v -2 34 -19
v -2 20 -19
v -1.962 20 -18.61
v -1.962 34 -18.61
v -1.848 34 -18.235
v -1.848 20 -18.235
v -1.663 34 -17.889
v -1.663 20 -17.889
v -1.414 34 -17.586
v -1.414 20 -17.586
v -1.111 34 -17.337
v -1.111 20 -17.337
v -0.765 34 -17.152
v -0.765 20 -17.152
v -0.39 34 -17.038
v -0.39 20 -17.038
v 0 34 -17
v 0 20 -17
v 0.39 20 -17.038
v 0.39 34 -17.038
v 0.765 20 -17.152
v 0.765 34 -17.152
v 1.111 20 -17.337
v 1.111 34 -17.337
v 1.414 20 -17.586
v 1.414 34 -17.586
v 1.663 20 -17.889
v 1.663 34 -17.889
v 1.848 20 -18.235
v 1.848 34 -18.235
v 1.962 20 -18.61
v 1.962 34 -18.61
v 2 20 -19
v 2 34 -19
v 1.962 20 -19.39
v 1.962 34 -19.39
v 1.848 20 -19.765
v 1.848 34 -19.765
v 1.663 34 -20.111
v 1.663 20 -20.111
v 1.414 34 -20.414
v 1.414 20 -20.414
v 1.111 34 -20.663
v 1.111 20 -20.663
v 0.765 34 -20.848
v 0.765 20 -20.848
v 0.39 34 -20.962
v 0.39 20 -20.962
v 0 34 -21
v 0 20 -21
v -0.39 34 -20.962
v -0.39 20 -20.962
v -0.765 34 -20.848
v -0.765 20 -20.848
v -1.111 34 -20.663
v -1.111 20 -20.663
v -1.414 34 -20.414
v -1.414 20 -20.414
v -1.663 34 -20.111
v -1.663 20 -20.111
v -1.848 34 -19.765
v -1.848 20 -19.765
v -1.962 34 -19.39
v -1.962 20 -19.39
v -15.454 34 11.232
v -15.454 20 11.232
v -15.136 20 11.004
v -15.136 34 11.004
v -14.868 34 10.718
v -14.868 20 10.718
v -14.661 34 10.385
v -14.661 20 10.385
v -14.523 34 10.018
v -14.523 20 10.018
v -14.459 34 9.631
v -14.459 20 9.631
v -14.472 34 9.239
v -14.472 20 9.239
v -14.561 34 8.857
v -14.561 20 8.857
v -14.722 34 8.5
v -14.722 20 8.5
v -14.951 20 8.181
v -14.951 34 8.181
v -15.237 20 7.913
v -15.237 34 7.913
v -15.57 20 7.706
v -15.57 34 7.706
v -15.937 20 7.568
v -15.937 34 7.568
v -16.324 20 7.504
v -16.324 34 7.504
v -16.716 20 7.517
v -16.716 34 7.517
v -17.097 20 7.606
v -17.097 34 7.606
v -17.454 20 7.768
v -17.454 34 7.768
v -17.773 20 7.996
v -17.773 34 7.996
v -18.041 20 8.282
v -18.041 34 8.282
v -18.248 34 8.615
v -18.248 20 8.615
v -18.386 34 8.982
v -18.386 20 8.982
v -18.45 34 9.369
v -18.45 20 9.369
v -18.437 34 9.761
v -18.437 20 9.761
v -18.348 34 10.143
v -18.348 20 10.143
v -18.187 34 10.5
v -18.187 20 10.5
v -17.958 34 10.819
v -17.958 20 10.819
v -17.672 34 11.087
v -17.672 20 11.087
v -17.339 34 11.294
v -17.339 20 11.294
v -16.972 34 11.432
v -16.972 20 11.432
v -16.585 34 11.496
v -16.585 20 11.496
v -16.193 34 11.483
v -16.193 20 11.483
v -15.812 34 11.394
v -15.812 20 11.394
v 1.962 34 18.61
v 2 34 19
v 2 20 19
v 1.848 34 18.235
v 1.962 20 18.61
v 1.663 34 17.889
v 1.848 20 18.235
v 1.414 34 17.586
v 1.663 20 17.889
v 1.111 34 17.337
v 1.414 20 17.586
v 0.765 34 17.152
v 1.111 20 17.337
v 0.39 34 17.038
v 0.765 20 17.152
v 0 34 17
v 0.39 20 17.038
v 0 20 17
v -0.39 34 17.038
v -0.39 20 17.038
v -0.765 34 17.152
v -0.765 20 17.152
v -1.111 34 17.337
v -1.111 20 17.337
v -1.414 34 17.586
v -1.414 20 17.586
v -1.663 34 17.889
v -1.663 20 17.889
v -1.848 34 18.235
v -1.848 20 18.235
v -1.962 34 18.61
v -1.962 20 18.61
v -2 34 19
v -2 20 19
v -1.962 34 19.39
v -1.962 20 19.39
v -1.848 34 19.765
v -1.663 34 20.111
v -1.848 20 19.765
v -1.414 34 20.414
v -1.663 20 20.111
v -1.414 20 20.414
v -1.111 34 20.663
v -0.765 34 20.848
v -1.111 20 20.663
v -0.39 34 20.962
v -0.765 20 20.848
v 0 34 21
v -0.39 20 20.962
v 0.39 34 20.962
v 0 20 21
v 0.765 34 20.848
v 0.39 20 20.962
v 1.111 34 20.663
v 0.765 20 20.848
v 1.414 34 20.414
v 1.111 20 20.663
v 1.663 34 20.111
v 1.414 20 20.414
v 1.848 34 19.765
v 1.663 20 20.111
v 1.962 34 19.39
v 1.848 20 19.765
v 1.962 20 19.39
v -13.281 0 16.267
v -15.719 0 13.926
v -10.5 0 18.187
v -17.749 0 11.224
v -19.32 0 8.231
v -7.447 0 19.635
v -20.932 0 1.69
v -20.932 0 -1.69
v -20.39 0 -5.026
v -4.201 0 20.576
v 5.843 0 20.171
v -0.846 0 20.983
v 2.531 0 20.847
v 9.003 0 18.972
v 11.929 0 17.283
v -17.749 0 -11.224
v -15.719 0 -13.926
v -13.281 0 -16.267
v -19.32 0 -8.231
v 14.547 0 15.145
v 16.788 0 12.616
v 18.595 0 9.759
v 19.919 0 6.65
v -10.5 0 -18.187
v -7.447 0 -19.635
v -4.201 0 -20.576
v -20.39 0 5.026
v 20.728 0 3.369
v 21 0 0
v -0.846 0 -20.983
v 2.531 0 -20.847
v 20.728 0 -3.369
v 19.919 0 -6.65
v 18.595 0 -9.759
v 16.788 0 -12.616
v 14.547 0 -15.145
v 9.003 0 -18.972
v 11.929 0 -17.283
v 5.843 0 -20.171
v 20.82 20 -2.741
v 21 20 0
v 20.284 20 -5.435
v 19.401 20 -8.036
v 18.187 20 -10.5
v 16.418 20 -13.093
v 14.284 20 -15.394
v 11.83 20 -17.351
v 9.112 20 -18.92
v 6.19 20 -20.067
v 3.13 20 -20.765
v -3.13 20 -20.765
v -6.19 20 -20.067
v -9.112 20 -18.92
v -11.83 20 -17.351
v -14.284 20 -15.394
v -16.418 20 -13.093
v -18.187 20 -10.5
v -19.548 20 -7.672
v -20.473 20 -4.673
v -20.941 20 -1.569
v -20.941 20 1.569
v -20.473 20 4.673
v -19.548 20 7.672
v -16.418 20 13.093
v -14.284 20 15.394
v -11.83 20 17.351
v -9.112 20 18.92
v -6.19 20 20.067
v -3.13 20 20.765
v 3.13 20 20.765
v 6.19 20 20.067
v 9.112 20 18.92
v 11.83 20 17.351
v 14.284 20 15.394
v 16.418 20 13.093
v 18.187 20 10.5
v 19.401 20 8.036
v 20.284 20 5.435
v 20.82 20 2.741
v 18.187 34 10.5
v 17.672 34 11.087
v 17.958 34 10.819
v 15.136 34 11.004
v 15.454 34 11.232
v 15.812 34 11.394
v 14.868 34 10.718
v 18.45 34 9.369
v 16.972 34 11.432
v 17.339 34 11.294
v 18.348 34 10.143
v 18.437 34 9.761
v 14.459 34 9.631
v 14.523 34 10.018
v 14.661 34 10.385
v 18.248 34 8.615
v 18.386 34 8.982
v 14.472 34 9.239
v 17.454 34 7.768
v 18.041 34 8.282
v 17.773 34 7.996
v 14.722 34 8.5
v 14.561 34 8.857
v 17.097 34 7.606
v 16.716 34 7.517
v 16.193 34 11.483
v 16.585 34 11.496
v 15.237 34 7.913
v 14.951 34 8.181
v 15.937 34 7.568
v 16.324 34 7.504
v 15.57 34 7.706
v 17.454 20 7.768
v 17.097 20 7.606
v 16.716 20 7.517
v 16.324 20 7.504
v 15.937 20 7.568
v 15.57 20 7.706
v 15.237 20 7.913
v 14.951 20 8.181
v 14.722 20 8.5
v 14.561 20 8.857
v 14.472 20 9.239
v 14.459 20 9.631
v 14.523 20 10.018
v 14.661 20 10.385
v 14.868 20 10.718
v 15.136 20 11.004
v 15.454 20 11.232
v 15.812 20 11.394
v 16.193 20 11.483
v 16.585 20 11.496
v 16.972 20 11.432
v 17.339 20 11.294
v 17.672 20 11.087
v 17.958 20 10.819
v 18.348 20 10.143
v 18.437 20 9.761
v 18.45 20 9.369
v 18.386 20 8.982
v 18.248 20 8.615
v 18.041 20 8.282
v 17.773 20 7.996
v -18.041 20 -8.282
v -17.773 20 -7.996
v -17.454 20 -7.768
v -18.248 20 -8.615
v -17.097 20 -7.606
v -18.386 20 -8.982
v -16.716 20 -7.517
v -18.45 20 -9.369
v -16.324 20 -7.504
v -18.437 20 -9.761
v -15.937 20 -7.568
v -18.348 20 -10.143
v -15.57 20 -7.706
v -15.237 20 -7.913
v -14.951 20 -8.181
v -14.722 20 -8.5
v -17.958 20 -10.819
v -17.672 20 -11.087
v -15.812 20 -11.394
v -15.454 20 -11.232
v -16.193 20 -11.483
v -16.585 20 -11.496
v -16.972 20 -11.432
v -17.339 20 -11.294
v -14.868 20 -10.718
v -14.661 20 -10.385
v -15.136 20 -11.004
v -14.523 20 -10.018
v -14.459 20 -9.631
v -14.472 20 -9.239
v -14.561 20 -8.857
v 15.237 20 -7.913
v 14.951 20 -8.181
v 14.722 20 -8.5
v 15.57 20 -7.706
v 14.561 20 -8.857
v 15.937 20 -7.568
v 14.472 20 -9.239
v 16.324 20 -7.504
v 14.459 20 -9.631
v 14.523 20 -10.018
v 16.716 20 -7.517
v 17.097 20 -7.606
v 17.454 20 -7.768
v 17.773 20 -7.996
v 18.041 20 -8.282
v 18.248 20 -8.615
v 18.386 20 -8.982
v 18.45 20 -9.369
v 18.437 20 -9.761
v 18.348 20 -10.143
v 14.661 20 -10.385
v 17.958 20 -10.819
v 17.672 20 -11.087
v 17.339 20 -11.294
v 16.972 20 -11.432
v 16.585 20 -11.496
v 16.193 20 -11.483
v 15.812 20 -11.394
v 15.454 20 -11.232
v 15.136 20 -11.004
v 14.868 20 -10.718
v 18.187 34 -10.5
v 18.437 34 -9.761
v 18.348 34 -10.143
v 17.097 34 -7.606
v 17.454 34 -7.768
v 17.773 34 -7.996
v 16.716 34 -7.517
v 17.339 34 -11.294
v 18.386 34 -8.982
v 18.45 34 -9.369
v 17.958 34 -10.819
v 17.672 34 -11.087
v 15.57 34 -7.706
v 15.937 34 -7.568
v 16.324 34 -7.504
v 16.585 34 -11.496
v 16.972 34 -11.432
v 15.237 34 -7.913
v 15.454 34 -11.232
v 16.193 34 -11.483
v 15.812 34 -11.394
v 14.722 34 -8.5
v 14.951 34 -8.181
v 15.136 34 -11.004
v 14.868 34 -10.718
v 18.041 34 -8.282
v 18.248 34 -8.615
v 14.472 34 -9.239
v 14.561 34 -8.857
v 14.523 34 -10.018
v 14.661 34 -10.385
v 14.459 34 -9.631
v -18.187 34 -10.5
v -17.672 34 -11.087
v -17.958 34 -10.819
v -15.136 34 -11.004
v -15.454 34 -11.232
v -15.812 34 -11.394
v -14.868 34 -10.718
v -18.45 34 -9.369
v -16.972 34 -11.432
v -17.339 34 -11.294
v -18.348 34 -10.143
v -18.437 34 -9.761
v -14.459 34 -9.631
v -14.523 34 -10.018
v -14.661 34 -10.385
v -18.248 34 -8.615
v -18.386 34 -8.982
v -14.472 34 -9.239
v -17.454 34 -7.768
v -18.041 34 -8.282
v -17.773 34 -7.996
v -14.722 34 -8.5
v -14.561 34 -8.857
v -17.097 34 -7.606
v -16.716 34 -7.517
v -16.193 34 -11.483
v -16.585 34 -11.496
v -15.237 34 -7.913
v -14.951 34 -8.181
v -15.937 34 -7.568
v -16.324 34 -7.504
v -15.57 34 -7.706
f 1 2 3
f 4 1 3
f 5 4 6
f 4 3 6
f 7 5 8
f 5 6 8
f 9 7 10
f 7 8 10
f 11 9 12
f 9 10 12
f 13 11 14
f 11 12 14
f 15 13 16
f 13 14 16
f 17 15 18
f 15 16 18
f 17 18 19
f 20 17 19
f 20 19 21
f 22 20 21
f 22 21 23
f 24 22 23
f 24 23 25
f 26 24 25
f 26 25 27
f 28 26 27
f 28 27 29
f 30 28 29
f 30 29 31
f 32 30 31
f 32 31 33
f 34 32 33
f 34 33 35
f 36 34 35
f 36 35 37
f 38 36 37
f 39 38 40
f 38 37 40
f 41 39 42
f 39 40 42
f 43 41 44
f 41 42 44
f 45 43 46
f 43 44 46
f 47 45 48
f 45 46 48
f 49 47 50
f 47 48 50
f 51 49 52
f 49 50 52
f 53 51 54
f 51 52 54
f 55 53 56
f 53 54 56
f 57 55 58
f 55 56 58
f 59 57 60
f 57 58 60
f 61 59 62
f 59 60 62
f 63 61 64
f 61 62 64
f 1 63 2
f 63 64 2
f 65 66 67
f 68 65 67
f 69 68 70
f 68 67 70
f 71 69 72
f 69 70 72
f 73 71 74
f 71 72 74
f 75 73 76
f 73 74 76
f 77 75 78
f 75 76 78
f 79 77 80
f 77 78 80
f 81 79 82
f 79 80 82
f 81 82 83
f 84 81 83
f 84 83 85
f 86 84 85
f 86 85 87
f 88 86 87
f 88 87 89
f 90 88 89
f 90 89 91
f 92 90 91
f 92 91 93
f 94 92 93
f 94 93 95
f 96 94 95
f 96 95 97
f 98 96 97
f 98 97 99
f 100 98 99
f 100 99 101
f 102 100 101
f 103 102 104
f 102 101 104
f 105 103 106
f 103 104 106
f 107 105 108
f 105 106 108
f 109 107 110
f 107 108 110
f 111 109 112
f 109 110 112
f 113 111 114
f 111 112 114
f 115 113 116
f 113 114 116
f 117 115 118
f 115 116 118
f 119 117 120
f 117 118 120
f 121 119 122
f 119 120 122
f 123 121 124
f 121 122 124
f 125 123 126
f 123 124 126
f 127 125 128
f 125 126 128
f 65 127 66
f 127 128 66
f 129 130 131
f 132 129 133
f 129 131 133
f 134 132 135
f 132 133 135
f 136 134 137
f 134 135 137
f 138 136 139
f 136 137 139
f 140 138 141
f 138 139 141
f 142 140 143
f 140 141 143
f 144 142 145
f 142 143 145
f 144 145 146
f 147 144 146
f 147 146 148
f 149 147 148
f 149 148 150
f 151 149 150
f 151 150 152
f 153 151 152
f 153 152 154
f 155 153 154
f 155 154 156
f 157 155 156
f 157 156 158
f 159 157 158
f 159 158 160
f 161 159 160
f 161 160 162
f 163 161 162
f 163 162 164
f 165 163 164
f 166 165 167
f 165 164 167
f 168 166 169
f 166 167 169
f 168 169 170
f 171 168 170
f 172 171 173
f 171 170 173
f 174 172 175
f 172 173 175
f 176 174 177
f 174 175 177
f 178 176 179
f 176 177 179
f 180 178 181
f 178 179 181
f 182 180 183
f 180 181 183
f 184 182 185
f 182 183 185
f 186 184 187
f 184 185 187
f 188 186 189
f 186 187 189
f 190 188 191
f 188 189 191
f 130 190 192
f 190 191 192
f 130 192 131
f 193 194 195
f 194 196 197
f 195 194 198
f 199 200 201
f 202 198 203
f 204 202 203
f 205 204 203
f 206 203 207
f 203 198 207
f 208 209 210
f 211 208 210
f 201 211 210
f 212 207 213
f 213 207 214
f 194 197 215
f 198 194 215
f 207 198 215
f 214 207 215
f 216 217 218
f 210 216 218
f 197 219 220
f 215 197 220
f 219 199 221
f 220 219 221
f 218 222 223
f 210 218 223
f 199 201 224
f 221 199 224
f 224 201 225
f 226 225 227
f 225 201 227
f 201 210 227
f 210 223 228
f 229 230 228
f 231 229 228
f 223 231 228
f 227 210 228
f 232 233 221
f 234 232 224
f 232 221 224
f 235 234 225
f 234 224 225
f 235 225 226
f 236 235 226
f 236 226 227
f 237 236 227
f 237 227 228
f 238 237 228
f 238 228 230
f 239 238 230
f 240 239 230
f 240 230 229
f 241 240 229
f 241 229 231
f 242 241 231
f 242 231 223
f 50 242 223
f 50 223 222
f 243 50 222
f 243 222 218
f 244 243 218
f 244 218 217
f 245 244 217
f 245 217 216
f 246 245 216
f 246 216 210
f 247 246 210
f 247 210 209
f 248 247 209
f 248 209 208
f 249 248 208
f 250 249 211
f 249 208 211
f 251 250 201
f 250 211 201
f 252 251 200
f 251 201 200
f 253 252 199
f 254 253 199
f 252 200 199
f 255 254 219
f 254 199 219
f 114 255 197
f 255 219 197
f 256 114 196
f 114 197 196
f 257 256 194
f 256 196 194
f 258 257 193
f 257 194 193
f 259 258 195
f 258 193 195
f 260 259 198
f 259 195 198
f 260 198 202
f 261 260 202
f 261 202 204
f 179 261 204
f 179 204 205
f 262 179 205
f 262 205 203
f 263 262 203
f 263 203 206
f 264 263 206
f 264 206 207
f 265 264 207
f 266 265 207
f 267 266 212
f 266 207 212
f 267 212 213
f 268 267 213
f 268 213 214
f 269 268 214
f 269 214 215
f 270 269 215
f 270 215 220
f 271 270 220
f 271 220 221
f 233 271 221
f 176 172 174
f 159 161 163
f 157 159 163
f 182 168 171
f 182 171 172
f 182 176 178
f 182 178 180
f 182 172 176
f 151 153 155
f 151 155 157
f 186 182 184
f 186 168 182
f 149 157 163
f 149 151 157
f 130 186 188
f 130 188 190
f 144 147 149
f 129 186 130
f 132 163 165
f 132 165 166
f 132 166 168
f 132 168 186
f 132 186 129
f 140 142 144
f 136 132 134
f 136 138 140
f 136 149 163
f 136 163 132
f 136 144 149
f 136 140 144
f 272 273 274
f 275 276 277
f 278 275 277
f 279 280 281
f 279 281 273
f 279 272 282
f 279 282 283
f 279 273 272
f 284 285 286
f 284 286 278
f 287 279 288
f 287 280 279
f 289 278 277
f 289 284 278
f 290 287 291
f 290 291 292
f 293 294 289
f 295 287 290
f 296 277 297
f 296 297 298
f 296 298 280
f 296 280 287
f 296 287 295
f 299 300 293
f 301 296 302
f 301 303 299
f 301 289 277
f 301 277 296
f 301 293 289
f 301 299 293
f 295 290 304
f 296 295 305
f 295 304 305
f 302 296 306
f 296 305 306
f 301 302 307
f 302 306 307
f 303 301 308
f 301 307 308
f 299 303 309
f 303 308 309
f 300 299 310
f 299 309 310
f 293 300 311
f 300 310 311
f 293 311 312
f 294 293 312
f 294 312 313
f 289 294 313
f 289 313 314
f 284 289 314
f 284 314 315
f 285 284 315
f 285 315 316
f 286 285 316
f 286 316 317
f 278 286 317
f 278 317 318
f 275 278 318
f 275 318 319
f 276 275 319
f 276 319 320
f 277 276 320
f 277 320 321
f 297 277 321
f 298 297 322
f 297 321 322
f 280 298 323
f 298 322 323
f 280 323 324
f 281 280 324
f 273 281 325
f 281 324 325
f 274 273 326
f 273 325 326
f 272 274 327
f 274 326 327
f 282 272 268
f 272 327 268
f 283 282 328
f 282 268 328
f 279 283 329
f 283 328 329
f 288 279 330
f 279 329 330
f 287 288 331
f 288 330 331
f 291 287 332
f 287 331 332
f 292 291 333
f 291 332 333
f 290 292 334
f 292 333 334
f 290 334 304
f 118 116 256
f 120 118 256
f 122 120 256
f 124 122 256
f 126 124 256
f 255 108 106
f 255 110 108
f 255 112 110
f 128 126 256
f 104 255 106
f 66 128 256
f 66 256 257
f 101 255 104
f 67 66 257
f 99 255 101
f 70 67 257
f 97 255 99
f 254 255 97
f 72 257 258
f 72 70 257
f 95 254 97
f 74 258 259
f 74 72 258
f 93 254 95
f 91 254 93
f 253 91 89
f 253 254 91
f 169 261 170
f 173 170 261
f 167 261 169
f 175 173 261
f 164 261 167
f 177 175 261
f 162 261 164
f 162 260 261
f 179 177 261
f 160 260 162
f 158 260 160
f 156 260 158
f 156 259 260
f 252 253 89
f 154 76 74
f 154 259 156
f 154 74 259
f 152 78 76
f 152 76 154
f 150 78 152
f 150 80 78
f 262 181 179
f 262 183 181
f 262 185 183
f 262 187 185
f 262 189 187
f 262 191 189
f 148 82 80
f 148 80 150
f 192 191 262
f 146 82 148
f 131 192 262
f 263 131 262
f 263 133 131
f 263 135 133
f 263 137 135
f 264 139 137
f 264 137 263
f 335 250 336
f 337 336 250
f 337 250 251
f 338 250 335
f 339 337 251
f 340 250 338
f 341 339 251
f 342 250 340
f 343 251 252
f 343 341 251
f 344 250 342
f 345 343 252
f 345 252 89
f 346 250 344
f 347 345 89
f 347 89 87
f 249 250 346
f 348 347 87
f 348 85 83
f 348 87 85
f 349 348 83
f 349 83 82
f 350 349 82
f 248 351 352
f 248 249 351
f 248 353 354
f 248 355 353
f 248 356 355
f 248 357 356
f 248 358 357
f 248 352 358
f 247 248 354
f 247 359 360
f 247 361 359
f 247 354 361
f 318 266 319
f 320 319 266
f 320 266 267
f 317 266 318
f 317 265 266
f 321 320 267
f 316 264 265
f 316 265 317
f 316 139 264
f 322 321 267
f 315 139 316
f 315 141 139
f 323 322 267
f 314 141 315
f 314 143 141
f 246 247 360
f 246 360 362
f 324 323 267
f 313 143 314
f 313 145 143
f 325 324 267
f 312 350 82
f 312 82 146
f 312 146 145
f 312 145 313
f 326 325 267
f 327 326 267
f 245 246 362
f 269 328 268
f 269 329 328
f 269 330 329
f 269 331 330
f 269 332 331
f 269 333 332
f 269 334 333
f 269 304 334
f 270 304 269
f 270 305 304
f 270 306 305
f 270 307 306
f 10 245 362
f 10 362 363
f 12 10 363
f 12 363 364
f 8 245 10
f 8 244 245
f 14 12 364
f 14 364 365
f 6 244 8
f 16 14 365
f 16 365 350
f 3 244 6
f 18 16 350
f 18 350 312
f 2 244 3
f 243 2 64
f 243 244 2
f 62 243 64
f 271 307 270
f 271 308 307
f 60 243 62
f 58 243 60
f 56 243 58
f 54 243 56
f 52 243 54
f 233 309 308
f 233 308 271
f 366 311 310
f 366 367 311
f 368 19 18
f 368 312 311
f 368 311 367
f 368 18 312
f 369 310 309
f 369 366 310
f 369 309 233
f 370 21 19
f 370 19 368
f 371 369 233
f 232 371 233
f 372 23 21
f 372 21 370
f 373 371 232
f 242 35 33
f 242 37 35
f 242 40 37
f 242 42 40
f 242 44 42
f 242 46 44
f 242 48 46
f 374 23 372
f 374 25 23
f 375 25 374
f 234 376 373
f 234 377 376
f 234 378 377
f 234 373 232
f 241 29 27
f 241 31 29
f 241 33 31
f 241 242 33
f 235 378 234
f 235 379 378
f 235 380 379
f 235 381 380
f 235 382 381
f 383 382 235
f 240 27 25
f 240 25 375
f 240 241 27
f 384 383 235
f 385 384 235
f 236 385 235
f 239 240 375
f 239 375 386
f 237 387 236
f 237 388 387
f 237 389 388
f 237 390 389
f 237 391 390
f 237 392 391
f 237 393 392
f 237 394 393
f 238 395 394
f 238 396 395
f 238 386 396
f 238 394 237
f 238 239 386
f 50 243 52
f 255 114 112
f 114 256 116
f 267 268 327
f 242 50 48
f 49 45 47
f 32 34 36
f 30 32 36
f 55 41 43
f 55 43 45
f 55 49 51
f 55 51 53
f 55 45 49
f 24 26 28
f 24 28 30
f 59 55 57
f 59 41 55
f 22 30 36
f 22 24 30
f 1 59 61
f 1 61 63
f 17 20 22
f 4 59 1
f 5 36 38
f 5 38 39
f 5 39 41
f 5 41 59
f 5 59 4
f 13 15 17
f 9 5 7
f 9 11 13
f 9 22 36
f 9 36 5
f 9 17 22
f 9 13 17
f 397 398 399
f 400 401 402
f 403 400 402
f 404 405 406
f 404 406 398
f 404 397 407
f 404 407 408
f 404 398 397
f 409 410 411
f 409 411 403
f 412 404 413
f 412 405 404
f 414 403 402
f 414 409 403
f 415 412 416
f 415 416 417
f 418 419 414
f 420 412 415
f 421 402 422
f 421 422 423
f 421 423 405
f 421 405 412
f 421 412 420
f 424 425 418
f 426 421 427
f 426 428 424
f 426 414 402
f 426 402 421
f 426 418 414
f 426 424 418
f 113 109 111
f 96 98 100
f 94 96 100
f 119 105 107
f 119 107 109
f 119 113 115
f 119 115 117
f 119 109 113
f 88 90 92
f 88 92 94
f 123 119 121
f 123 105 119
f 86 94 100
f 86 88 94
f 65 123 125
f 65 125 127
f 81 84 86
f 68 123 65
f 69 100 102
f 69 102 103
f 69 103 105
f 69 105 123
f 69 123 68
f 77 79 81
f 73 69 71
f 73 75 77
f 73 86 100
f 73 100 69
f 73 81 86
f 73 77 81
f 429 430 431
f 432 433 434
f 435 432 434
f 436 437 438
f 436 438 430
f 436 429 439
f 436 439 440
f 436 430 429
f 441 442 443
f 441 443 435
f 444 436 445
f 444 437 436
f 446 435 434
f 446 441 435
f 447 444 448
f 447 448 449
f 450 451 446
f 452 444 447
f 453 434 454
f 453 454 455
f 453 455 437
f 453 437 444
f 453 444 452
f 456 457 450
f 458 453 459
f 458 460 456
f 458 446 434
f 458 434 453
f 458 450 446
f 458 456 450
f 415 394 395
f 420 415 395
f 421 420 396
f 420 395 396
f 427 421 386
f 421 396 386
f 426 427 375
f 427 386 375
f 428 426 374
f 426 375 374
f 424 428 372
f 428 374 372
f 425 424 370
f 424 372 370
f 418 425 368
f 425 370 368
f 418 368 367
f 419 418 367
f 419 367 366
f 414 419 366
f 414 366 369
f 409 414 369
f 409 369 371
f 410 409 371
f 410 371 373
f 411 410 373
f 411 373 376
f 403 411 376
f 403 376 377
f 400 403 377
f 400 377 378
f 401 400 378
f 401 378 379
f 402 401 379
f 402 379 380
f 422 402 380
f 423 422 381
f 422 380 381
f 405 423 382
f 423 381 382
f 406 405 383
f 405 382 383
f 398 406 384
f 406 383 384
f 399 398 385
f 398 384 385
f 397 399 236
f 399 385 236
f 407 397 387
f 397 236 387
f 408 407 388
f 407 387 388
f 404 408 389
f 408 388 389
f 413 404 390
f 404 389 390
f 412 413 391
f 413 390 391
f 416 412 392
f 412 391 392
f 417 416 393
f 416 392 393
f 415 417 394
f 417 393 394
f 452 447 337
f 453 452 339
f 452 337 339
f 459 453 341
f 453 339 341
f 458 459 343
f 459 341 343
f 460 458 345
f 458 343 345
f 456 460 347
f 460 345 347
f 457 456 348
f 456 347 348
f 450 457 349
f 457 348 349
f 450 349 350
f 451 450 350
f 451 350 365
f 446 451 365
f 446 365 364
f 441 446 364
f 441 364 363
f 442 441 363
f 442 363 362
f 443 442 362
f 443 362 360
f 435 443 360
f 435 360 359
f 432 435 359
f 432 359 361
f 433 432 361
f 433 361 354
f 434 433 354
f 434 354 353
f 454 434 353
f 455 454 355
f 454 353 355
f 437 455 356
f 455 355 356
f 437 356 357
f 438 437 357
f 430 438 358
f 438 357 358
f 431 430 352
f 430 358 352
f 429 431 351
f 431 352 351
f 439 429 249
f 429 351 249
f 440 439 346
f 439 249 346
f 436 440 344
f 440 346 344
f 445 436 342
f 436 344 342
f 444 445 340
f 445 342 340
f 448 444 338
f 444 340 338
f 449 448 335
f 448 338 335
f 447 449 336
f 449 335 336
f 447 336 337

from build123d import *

# Parameters (mm, degrees)
SKETCH1_R           = 21
BOSS_EXTRUDE1_DEPTH = 20
SKETCH2_R           = 2
BOSS_EXTRUDE3_DEPTH = 14
CIRPATTERN1_COUNT   = 6


with BuildPart() as part:
    # Sketch1 → Boss-Extrude1 (new body)
    with BuildSketch(Plane(origin=(0, 0, 0), x_dir=(1, 0, 0), z_dir=(0, 1, 0))):
        Circle(SKETCH1_R)
    extrude(amount=BOSS_EXTRUDE1_DEPTH)

    # Sketch2 → Boss-Extrude3 (add)
    with BuildSketch(Plane(origin=(0, 20, 0), x_dir=(1, 0, 0), z_dir=(0, 1, 0))):
        with Locations((0, -19)):
            Circle(SKETCH2_R)
    boss_extrude3 = extrude(amount=BOSS_EXTRUDE3_DEPTH)

    # CirPattern1: Boss-Extrude3 ×6 about axis
    cirpattern1_axis = Axis((0, 0, 0), (0, 1, 0))
    for i in range(1, CIRPATTERN1_COUNT):
        add(boss_extrude3.rotate(cirpattern1_axis, i * 360 / CIRPATTERN1_COUNT))


solid = part.part
